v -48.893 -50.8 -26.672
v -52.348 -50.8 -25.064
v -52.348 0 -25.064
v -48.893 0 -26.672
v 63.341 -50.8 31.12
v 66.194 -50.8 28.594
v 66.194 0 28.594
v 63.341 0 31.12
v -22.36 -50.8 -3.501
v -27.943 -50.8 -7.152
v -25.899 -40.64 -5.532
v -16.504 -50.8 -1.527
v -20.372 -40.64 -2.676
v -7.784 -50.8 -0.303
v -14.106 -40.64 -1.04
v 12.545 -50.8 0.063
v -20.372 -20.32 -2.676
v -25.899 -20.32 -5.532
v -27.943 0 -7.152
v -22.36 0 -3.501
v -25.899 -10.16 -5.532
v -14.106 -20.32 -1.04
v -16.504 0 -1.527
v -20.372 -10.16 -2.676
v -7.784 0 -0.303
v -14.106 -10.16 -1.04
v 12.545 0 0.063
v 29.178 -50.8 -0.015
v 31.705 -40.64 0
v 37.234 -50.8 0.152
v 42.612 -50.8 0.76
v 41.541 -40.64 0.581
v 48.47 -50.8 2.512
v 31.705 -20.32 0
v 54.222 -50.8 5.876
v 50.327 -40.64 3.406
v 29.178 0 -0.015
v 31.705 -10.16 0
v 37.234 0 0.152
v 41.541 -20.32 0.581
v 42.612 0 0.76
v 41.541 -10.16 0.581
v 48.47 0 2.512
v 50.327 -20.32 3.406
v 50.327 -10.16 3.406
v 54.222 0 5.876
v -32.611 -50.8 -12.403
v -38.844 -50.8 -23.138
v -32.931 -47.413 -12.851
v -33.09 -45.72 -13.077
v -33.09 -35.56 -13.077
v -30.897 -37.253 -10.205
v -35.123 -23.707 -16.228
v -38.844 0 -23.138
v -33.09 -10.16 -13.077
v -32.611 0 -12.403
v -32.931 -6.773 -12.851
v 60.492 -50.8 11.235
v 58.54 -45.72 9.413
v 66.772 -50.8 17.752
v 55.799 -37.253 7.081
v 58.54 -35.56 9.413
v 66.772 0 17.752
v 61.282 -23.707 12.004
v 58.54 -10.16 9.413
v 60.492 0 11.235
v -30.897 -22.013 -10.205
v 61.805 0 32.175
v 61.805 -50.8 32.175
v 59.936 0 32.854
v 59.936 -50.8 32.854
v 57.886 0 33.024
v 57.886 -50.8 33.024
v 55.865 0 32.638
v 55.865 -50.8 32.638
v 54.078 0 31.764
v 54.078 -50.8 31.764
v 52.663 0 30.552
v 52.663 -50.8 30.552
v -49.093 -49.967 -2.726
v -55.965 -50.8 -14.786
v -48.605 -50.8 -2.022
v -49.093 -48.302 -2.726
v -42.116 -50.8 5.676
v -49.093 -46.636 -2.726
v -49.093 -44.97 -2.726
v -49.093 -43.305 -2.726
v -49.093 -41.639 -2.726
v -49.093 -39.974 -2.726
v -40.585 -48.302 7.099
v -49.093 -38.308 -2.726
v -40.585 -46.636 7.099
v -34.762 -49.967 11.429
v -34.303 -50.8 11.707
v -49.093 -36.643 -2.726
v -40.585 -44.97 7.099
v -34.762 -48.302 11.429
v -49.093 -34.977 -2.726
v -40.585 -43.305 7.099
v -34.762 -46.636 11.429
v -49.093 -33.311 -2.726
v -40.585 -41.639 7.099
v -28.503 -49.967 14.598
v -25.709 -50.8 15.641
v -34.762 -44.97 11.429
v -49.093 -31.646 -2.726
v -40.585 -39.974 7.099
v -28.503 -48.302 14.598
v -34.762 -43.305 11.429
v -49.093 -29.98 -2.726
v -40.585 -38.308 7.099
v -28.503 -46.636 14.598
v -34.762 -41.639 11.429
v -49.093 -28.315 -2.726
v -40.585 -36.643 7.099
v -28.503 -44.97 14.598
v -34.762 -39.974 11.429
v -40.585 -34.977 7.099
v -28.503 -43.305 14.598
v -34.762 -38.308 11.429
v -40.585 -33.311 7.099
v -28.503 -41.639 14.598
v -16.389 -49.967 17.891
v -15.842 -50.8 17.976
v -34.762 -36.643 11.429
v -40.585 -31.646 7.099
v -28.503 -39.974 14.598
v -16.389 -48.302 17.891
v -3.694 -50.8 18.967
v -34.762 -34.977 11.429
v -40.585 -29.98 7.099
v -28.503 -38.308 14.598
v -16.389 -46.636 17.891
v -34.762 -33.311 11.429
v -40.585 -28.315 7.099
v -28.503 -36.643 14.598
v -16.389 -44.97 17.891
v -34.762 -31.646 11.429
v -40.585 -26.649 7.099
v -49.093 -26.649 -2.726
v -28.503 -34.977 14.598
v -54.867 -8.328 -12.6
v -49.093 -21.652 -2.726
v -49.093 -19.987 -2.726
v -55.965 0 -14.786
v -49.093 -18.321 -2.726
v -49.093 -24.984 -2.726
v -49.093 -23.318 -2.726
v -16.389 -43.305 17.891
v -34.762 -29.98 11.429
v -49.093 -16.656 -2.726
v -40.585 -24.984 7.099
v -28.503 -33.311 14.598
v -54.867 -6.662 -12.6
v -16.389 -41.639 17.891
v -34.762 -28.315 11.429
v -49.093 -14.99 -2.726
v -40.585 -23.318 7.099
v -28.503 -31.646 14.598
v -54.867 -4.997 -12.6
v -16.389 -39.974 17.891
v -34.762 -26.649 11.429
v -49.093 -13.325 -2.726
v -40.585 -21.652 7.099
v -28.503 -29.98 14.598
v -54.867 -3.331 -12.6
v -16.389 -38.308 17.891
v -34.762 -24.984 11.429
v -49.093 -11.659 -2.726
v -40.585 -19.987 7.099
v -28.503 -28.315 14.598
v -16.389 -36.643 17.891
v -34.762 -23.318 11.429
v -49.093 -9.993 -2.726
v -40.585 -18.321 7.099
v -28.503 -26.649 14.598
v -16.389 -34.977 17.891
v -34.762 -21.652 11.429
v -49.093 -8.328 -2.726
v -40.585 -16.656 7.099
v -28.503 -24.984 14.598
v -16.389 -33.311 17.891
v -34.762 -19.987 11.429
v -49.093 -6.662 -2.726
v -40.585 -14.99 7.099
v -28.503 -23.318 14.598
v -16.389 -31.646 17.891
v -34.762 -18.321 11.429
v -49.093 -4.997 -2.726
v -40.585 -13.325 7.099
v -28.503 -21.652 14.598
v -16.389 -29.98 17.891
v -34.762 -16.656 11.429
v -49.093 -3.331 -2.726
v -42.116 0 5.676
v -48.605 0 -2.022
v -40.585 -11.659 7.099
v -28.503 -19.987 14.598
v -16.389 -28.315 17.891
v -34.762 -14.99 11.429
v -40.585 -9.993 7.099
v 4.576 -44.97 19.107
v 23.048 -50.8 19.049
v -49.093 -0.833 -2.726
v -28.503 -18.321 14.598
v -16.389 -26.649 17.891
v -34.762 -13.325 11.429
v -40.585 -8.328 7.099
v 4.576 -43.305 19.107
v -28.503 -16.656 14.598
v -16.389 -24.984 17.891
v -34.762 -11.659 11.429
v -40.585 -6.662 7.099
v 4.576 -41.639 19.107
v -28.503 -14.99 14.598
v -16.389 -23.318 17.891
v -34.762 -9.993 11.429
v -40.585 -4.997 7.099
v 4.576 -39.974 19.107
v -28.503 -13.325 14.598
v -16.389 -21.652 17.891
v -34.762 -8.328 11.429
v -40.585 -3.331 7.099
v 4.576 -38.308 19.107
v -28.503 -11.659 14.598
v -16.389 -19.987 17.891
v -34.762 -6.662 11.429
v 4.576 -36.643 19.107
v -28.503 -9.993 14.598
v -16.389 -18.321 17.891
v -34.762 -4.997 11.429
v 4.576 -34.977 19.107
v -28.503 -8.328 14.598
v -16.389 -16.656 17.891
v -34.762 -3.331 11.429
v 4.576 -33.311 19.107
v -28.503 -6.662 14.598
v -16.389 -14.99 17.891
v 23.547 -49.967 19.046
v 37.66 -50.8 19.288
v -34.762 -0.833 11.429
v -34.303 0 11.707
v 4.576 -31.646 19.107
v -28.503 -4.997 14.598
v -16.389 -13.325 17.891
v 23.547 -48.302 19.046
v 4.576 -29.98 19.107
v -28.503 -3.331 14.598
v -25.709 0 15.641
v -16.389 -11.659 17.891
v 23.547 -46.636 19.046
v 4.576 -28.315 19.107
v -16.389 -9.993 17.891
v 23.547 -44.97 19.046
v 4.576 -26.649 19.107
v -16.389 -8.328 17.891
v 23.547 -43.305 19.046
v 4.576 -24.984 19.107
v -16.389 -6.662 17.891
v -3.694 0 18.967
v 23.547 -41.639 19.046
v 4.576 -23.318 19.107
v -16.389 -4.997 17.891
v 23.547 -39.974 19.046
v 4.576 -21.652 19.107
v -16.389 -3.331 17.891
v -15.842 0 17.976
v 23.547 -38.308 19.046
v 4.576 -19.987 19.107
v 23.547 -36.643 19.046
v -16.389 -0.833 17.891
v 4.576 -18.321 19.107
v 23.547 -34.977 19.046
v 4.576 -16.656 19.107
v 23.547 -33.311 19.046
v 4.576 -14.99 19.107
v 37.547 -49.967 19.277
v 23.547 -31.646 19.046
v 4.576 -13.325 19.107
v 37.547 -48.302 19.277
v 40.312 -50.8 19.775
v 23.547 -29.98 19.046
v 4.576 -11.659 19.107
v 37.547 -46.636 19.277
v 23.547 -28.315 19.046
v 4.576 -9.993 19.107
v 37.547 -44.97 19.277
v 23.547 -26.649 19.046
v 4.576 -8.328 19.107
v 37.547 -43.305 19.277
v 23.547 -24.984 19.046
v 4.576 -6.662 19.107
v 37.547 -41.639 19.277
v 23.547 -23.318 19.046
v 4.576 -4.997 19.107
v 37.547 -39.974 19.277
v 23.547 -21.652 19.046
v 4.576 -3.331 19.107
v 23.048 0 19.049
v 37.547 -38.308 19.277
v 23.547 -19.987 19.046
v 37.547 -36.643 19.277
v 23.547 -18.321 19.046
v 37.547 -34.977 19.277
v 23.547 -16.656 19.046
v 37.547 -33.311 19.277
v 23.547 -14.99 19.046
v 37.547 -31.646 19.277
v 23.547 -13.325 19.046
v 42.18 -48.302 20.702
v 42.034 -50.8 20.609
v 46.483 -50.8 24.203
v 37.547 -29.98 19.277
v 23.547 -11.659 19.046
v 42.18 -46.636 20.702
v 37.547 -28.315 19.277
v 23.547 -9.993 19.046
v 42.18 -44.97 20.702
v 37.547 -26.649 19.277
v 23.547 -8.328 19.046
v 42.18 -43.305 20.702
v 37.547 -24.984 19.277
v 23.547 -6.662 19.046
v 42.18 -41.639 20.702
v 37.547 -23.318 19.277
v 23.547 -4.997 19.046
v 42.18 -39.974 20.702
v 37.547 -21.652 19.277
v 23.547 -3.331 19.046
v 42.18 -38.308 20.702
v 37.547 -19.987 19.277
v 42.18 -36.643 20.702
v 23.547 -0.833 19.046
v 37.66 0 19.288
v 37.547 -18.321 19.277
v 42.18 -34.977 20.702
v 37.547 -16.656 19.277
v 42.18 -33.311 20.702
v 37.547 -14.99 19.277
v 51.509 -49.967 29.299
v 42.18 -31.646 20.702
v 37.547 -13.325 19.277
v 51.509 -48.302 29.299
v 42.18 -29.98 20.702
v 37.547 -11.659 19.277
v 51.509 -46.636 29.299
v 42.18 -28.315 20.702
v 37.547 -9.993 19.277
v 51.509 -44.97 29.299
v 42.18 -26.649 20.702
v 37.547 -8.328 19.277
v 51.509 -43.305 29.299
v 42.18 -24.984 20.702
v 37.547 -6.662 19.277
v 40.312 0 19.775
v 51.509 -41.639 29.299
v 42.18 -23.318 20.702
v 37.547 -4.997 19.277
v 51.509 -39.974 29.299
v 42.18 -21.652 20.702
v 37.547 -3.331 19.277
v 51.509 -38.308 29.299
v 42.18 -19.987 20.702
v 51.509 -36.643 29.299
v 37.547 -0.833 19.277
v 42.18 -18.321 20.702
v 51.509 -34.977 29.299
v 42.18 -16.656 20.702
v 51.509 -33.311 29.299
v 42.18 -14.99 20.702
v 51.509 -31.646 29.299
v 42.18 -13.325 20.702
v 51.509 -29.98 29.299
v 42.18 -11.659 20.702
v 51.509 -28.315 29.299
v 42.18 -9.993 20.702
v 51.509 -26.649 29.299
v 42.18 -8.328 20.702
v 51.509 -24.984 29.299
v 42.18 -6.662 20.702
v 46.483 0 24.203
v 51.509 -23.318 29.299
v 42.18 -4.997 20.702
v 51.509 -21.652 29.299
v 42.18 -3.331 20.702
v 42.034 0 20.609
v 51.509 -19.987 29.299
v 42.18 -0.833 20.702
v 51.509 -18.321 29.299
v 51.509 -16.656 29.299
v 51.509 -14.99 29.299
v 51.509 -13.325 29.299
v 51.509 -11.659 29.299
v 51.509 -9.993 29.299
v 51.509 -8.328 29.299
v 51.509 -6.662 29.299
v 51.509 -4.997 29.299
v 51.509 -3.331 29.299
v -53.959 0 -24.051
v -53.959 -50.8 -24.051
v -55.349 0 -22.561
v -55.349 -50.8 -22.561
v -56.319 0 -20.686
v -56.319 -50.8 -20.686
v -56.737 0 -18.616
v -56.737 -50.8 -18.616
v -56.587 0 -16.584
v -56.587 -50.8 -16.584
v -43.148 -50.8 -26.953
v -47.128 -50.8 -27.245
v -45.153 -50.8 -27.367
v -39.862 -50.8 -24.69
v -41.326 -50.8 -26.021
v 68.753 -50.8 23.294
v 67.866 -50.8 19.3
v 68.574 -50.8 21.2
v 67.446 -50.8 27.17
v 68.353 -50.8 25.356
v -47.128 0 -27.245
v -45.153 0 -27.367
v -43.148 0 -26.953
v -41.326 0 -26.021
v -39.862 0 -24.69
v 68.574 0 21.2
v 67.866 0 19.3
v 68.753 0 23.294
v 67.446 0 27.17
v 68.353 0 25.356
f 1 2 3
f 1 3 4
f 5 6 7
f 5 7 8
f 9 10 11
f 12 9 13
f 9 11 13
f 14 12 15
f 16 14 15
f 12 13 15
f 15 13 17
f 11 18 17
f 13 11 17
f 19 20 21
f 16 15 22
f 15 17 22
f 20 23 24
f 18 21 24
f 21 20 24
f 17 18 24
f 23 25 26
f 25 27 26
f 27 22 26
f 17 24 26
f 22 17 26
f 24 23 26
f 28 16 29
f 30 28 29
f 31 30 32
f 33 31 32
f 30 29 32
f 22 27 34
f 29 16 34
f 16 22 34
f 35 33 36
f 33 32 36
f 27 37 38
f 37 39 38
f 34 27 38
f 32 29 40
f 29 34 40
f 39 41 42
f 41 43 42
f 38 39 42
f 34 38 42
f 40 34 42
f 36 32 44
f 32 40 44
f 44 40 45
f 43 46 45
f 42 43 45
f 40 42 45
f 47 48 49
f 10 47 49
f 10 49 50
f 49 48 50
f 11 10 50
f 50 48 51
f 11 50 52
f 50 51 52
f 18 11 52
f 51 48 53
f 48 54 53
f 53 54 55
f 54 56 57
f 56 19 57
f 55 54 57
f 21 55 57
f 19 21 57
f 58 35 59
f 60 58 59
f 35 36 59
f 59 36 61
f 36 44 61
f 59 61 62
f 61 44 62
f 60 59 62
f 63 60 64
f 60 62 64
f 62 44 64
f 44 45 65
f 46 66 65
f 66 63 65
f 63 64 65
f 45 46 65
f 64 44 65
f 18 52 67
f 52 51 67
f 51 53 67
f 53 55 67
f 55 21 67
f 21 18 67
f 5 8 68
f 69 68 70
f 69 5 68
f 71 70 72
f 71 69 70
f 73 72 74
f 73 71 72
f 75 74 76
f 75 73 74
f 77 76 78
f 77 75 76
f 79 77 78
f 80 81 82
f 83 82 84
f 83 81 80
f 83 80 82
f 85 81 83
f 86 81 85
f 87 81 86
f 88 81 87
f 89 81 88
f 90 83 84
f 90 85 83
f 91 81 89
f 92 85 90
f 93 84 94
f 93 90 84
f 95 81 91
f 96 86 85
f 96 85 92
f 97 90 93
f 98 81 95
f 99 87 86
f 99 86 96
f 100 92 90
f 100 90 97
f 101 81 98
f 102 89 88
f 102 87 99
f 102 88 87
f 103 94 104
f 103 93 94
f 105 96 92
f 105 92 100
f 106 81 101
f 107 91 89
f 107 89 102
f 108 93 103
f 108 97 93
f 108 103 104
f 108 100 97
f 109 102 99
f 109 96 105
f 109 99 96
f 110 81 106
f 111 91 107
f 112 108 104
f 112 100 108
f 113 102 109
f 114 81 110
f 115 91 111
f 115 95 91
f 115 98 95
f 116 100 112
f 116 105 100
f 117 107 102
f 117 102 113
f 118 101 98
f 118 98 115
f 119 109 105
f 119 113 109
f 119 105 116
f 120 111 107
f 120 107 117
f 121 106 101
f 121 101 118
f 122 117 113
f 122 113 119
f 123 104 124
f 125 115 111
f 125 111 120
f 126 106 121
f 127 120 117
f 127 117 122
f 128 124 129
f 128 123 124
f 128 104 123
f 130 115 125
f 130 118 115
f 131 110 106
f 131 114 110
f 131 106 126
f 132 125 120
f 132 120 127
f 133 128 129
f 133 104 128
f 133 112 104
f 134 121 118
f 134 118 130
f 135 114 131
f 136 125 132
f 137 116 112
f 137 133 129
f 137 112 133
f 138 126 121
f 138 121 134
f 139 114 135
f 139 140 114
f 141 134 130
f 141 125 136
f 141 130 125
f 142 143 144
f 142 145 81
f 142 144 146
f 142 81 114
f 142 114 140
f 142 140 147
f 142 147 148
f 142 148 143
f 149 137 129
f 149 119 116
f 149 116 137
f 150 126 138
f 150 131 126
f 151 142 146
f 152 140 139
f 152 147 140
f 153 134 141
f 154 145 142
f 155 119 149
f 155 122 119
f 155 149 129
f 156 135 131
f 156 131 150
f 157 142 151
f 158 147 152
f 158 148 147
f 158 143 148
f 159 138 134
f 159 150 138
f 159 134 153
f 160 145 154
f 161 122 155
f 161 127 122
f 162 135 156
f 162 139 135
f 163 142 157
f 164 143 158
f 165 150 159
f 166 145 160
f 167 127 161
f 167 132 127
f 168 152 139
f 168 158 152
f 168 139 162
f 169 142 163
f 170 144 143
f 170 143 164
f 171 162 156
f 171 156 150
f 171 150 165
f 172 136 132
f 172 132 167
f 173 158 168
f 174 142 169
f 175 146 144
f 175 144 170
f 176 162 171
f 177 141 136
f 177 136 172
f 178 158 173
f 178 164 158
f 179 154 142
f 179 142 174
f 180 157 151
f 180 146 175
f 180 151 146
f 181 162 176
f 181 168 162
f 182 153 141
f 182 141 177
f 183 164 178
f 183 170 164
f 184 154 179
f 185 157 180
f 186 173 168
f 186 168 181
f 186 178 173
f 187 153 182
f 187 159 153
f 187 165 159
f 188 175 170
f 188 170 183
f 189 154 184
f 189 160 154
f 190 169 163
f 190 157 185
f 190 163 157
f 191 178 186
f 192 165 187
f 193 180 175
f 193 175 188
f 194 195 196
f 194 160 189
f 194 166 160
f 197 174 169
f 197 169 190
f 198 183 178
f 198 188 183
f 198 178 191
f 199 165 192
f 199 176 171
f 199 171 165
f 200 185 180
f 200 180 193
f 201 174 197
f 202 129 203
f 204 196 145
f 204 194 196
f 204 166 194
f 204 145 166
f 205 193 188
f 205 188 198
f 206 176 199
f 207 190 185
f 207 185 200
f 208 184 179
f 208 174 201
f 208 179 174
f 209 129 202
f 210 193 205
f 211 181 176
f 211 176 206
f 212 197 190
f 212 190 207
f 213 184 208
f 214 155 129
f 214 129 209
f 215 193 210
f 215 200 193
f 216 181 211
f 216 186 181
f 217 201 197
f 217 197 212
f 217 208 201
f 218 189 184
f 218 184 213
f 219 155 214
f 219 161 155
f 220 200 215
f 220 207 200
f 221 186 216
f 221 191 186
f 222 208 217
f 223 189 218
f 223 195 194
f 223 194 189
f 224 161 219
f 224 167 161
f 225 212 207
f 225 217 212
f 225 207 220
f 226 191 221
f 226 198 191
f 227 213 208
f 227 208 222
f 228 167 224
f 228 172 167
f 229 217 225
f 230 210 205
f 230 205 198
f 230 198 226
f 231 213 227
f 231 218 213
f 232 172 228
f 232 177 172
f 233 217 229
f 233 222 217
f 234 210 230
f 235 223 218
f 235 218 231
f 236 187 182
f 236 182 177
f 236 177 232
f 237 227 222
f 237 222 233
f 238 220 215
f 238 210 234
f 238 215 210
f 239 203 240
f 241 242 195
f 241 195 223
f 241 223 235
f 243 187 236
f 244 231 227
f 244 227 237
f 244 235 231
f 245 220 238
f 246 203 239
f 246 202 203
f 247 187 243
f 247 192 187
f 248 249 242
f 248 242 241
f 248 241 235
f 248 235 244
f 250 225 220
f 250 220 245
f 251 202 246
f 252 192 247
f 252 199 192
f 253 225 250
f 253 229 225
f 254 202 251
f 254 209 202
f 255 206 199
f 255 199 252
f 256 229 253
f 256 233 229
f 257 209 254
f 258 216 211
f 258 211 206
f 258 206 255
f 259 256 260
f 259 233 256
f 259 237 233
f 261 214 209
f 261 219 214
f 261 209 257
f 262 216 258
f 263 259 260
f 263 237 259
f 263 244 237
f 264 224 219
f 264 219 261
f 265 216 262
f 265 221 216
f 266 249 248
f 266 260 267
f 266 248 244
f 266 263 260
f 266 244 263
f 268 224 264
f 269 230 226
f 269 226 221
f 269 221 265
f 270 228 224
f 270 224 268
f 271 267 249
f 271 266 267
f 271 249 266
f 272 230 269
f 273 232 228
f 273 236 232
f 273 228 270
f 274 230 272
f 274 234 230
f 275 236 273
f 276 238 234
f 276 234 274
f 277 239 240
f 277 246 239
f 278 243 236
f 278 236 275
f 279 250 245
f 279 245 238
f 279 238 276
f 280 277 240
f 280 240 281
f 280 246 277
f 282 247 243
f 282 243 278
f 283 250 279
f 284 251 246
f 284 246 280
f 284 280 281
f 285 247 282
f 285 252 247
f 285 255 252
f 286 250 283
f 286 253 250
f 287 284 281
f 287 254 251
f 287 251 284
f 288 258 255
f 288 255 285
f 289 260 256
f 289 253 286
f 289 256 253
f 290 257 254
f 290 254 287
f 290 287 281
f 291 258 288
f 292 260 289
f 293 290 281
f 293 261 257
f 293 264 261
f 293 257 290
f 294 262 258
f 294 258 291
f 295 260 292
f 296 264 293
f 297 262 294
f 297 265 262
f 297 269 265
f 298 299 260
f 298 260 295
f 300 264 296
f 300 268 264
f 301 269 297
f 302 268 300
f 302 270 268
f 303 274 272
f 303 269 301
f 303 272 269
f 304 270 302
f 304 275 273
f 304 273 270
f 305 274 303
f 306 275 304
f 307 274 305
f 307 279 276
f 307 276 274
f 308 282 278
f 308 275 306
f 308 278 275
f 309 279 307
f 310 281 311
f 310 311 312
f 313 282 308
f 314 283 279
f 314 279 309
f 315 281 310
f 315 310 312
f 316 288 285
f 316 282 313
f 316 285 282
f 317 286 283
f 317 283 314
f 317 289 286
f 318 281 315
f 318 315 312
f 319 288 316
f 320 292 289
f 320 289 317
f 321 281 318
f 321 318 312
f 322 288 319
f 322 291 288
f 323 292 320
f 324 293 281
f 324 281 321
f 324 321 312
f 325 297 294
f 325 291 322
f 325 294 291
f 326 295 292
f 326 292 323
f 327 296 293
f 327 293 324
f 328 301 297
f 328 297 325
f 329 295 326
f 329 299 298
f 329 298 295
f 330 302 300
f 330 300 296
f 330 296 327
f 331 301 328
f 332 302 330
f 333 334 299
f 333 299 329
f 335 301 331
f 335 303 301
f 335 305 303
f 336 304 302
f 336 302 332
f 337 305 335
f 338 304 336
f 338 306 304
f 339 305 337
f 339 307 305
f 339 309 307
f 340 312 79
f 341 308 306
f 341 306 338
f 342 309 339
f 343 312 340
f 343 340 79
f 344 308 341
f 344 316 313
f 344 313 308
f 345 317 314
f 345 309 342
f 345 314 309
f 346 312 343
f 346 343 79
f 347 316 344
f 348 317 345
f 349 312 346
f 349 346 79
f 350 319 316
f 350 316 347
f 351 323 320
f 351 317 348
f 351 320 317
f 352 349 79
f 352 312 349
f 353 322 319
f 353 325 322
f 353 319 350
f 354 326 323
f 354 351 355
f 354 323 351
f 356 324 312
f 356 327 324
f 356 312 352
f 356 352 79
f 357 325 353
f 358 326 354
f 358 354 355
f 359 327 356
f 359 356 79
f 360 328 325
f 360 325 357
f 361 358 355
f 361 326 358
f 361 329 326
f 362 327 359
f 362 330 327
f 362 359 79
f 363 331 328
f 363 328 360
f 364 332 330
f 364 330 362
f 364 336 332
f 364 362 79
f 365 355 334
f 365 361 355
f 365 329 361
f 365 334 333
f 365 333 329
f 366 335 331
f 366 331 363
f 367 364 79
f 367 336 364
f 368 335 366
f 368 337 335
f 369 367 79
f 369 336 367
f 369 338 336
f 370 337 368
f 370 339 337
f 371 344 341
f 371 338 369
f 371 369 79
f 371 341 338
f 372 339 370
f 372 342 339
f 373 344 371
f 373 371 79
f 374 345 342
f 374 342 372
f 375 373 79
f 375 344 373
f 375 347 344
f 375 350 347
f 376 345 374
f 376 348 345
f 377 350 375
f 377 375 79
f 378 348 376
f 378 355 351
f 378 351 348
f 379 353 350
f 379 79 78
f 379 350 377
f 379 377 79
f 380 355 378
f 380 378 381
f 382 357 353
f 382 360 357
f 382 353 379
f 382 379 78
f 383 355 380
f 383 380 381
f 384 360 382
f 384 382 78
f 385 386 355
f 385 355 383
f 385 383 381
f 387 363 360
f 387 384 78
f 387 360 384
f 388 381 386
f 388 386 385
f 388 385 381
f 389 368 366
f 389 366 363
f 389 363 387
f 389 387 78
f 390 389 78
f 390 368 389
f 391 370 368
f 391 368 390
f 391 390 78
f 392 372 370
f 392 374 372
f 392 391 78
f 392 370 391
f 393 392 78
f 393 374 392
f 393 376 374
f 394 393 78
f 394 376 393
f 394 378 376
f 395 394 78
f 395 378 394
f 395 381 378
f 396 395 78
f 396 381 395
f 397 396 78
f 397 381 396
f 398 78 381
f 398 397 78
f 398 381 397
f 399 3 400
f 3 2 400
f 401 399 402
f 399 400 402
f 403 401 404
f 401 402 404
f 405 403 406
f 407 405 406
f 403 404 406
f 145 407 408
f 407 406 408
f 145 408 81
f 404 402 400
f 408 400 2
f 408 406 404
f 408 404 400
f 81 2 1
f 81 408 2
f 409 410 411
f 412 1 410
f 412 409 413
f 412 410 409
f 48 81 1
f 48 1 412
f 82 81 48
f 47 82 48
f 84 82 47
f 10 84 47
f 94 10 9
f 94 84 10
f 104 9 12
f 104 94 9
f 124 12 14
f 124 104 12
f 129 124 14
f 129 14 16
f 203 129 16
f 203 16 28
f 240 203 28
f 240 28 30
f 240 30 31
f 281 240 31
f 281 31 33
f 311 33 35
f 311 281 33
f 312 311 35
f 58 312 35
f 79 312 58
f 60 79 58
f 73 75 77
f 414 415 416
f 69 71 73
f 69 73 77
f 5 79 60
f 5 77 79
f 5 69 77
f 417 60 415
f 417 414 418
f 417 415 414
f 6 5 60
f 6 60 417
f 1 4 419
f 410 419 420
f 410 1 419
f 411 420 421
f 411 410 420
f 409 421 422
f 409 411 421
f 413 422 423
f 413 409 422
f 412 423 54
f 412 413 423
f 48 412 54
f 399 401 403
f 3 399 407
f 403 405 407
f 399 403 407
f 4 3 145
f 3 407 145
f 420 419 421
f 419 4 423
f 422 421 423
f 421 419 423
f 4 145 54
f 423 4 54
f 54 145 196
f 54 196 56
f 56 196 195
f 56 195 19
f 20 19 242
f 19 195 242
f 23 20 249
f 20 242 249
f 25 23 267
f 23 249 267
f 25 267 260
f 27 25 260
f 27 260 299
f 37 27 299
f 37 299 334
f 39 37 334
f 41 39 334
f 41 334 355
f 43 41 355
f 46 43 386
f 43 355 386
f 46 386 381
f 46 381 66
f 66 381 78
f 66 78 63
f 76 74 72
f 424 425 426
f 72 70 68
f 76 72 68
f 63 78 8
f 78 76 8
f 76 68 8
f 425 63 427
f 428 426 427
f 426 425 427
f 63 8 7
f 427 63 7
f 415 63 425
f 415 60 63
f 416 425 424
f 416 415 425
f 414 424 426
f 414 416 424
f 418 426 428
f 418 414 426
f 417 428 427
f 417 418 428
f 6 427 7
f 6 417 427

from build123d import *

# Parameters (mm, degrees)
F1_DEPTH = 50.8
F2_R     = 7.62


# Not quite as in the source:
# - the dataset's text gives a spline's control points without its knots; the knots are read off the source's solid


with BuildPart() as f1:
    # F0 (on Front) → F1 (new body)
    with BuildSketch(Plane.XZ):
        with BuildLine():
            Line((-59.3070761655, -21.8227360142), (-42.0378260314, -29.8648439348))
            add(Edge.make_bspline(
                [(-42.0378260314, -29.8648439348), (-37.5408292143, -20.2082012168), (-28.7610191004, -1.3548435544), (0.1852591164, 0.4500649959), (31.4439243402, -0.3003332078), (51.7274502596, 0.7006149211), (64.7157226613, 15.3713666937), (71.9278976321, 23.5177949071)],
                knots=[0, 0, 0, 0, 0.2081160567, 0.4063199361, 0.6231846725, 0.7907606193, 1, 1, 1, 1], degree=3))
            Line((71.9278976321, 23.5177949071), (57.66448368, 36.1454440324))
            add(Edge.make_bspline(
                [(-59.3070761655, -21.8227360142), (-58.631822402, -20.372727352), (-57.2326609344, -17.3669870215), (-54.9195750463, -12.6269553993), (-52.290883787, -7.7265549055), (-49.7175719467, -3.561686059), (-47.3279051008, -0.2220423536), (-45.338427998, 2.2702424421), (-43.1183370493, 4.7275950198), (-41.0477397791, 6.7190800232), (-39.2442762759, 8.2556682686), (-38.0539774048, 9.1862612918), (-37.0623497299, 9.9095055954), (-36.0465553439, 10.6154075646), (-34.7650769471, 11.4423890704), (-33.2084485385, 12.3527532604), (-31.1196933377, 13.458167234), (-27.4494612164, 15.1196460437), (-22.2727789213, 16.7917213418), (-16.3376615725, 17.9817161001), (-11.6469124365, 18.5203096146), (-8.0400800968, 18.7814841119), (-5.4053373413, 18.9124255501), (-3.2675723307, 18.982544513), (-1.5906986648, 19.0230733609), (-0.3526104933, 19.0474071732), (0.87734965, 19.0675835008), (2.5219132672, 19.0896147925), (4.5769506756, 19.1085778208), (7.0383090768, 19.1198065178), (10.3046004987, 19.1221708173), (14.3424252523, 19.1066043772), (19.0599234, 19.0741289863), (22.8345528238, 19.0483452659), (25.7277137641, 19.0358659389), (27.8251785593, 19.0323438017), (29.5058814233, 19.035692451), (30.8030558592, 19.0429376699), (31.7561028254, 19.0508346878), (32.6626871735, 19.0613596046), (33.8021161008, 19.0804572118), (35.0978461461, 19.1162037558), (36.4431452359, 19.1827126493), (37.5801812791, 19.2732225909), (38.515911426, 19.3839735558), (39.5173517276, 19.5506644088), (40.1985488805, 19.7285768595), (40.6670707589, 19.8958738921), (40.9265642367, 20.0036637108), (41.1234439392, 20.0935670417), (41.2950071187, 20.1792714123), (41.439100667, 20.2560871994), (41.603013776, 20.3470701295), (41.8399423013, 20.4860480773), (42.2834626322, 20.7648864981), (42.9477447613, 21.2208645946), (43.8912236782, 21.9391381184), (44.9557550555, 22.8214415778), (46.5092157464, 24.2027241023), (48.6592995414, 26.2830875471), (51.4782616603, 29.2395128834), (54.4816322492, 32.550604721), (56.5873419532, 34.9287711439), (57.66448368, 36.1454440324)],
                knots=[0, 0, 0, 0, 0.03125, 0.0625, 0.09375, 0.125, 0.140625, 0.15625, 0.171875, 0.1875, 0.1953125, 0.203125, 0.20703125, 0.2109375, 0.21875, 0.2265625, 0.234375, 0.25, 0.28125, 0.3125, 0.34375, 0.359375, 0.375, 0.390625, 0.3984375, 0.40625, 0.4140625, 0.421875, 0.4375, 0.453125, 0.46875, 0.5, 0.53125, 0.5625, 0.578125, 0.59375, 0.609375, 0.6171875, 0.625, 0.6328125, 0.640625, 0.65625, 0.671875, 0.6875, 0.703125, 0.71875, 0.75, 0.765625, 0.7734375, 0.78125, 0.7890625, 0.79296875, 0.796875, 0.8046875, 0.8125, 0.828125, 0.84375, 0.859375, 0.875, 0.90625, 0.9375, 0.96875, 1, 1, 1, 1], degree=3))
        make_face()
    extrude(amount=F1_DEPTH)

    # F2
    f2_edges = [f1.edges().sort_by_distance(p)[0] for p in [
        (57.664484, -25.4, 36.145444),
        (71.927898, -25.4, 23.517795),
        (-59.307076, -25.4, -21.822736),
        (-42.037826, -25.4, -29.864844),
    ]]
    fillet(f2_edges, radius=F2_R)


solid = f1.part
